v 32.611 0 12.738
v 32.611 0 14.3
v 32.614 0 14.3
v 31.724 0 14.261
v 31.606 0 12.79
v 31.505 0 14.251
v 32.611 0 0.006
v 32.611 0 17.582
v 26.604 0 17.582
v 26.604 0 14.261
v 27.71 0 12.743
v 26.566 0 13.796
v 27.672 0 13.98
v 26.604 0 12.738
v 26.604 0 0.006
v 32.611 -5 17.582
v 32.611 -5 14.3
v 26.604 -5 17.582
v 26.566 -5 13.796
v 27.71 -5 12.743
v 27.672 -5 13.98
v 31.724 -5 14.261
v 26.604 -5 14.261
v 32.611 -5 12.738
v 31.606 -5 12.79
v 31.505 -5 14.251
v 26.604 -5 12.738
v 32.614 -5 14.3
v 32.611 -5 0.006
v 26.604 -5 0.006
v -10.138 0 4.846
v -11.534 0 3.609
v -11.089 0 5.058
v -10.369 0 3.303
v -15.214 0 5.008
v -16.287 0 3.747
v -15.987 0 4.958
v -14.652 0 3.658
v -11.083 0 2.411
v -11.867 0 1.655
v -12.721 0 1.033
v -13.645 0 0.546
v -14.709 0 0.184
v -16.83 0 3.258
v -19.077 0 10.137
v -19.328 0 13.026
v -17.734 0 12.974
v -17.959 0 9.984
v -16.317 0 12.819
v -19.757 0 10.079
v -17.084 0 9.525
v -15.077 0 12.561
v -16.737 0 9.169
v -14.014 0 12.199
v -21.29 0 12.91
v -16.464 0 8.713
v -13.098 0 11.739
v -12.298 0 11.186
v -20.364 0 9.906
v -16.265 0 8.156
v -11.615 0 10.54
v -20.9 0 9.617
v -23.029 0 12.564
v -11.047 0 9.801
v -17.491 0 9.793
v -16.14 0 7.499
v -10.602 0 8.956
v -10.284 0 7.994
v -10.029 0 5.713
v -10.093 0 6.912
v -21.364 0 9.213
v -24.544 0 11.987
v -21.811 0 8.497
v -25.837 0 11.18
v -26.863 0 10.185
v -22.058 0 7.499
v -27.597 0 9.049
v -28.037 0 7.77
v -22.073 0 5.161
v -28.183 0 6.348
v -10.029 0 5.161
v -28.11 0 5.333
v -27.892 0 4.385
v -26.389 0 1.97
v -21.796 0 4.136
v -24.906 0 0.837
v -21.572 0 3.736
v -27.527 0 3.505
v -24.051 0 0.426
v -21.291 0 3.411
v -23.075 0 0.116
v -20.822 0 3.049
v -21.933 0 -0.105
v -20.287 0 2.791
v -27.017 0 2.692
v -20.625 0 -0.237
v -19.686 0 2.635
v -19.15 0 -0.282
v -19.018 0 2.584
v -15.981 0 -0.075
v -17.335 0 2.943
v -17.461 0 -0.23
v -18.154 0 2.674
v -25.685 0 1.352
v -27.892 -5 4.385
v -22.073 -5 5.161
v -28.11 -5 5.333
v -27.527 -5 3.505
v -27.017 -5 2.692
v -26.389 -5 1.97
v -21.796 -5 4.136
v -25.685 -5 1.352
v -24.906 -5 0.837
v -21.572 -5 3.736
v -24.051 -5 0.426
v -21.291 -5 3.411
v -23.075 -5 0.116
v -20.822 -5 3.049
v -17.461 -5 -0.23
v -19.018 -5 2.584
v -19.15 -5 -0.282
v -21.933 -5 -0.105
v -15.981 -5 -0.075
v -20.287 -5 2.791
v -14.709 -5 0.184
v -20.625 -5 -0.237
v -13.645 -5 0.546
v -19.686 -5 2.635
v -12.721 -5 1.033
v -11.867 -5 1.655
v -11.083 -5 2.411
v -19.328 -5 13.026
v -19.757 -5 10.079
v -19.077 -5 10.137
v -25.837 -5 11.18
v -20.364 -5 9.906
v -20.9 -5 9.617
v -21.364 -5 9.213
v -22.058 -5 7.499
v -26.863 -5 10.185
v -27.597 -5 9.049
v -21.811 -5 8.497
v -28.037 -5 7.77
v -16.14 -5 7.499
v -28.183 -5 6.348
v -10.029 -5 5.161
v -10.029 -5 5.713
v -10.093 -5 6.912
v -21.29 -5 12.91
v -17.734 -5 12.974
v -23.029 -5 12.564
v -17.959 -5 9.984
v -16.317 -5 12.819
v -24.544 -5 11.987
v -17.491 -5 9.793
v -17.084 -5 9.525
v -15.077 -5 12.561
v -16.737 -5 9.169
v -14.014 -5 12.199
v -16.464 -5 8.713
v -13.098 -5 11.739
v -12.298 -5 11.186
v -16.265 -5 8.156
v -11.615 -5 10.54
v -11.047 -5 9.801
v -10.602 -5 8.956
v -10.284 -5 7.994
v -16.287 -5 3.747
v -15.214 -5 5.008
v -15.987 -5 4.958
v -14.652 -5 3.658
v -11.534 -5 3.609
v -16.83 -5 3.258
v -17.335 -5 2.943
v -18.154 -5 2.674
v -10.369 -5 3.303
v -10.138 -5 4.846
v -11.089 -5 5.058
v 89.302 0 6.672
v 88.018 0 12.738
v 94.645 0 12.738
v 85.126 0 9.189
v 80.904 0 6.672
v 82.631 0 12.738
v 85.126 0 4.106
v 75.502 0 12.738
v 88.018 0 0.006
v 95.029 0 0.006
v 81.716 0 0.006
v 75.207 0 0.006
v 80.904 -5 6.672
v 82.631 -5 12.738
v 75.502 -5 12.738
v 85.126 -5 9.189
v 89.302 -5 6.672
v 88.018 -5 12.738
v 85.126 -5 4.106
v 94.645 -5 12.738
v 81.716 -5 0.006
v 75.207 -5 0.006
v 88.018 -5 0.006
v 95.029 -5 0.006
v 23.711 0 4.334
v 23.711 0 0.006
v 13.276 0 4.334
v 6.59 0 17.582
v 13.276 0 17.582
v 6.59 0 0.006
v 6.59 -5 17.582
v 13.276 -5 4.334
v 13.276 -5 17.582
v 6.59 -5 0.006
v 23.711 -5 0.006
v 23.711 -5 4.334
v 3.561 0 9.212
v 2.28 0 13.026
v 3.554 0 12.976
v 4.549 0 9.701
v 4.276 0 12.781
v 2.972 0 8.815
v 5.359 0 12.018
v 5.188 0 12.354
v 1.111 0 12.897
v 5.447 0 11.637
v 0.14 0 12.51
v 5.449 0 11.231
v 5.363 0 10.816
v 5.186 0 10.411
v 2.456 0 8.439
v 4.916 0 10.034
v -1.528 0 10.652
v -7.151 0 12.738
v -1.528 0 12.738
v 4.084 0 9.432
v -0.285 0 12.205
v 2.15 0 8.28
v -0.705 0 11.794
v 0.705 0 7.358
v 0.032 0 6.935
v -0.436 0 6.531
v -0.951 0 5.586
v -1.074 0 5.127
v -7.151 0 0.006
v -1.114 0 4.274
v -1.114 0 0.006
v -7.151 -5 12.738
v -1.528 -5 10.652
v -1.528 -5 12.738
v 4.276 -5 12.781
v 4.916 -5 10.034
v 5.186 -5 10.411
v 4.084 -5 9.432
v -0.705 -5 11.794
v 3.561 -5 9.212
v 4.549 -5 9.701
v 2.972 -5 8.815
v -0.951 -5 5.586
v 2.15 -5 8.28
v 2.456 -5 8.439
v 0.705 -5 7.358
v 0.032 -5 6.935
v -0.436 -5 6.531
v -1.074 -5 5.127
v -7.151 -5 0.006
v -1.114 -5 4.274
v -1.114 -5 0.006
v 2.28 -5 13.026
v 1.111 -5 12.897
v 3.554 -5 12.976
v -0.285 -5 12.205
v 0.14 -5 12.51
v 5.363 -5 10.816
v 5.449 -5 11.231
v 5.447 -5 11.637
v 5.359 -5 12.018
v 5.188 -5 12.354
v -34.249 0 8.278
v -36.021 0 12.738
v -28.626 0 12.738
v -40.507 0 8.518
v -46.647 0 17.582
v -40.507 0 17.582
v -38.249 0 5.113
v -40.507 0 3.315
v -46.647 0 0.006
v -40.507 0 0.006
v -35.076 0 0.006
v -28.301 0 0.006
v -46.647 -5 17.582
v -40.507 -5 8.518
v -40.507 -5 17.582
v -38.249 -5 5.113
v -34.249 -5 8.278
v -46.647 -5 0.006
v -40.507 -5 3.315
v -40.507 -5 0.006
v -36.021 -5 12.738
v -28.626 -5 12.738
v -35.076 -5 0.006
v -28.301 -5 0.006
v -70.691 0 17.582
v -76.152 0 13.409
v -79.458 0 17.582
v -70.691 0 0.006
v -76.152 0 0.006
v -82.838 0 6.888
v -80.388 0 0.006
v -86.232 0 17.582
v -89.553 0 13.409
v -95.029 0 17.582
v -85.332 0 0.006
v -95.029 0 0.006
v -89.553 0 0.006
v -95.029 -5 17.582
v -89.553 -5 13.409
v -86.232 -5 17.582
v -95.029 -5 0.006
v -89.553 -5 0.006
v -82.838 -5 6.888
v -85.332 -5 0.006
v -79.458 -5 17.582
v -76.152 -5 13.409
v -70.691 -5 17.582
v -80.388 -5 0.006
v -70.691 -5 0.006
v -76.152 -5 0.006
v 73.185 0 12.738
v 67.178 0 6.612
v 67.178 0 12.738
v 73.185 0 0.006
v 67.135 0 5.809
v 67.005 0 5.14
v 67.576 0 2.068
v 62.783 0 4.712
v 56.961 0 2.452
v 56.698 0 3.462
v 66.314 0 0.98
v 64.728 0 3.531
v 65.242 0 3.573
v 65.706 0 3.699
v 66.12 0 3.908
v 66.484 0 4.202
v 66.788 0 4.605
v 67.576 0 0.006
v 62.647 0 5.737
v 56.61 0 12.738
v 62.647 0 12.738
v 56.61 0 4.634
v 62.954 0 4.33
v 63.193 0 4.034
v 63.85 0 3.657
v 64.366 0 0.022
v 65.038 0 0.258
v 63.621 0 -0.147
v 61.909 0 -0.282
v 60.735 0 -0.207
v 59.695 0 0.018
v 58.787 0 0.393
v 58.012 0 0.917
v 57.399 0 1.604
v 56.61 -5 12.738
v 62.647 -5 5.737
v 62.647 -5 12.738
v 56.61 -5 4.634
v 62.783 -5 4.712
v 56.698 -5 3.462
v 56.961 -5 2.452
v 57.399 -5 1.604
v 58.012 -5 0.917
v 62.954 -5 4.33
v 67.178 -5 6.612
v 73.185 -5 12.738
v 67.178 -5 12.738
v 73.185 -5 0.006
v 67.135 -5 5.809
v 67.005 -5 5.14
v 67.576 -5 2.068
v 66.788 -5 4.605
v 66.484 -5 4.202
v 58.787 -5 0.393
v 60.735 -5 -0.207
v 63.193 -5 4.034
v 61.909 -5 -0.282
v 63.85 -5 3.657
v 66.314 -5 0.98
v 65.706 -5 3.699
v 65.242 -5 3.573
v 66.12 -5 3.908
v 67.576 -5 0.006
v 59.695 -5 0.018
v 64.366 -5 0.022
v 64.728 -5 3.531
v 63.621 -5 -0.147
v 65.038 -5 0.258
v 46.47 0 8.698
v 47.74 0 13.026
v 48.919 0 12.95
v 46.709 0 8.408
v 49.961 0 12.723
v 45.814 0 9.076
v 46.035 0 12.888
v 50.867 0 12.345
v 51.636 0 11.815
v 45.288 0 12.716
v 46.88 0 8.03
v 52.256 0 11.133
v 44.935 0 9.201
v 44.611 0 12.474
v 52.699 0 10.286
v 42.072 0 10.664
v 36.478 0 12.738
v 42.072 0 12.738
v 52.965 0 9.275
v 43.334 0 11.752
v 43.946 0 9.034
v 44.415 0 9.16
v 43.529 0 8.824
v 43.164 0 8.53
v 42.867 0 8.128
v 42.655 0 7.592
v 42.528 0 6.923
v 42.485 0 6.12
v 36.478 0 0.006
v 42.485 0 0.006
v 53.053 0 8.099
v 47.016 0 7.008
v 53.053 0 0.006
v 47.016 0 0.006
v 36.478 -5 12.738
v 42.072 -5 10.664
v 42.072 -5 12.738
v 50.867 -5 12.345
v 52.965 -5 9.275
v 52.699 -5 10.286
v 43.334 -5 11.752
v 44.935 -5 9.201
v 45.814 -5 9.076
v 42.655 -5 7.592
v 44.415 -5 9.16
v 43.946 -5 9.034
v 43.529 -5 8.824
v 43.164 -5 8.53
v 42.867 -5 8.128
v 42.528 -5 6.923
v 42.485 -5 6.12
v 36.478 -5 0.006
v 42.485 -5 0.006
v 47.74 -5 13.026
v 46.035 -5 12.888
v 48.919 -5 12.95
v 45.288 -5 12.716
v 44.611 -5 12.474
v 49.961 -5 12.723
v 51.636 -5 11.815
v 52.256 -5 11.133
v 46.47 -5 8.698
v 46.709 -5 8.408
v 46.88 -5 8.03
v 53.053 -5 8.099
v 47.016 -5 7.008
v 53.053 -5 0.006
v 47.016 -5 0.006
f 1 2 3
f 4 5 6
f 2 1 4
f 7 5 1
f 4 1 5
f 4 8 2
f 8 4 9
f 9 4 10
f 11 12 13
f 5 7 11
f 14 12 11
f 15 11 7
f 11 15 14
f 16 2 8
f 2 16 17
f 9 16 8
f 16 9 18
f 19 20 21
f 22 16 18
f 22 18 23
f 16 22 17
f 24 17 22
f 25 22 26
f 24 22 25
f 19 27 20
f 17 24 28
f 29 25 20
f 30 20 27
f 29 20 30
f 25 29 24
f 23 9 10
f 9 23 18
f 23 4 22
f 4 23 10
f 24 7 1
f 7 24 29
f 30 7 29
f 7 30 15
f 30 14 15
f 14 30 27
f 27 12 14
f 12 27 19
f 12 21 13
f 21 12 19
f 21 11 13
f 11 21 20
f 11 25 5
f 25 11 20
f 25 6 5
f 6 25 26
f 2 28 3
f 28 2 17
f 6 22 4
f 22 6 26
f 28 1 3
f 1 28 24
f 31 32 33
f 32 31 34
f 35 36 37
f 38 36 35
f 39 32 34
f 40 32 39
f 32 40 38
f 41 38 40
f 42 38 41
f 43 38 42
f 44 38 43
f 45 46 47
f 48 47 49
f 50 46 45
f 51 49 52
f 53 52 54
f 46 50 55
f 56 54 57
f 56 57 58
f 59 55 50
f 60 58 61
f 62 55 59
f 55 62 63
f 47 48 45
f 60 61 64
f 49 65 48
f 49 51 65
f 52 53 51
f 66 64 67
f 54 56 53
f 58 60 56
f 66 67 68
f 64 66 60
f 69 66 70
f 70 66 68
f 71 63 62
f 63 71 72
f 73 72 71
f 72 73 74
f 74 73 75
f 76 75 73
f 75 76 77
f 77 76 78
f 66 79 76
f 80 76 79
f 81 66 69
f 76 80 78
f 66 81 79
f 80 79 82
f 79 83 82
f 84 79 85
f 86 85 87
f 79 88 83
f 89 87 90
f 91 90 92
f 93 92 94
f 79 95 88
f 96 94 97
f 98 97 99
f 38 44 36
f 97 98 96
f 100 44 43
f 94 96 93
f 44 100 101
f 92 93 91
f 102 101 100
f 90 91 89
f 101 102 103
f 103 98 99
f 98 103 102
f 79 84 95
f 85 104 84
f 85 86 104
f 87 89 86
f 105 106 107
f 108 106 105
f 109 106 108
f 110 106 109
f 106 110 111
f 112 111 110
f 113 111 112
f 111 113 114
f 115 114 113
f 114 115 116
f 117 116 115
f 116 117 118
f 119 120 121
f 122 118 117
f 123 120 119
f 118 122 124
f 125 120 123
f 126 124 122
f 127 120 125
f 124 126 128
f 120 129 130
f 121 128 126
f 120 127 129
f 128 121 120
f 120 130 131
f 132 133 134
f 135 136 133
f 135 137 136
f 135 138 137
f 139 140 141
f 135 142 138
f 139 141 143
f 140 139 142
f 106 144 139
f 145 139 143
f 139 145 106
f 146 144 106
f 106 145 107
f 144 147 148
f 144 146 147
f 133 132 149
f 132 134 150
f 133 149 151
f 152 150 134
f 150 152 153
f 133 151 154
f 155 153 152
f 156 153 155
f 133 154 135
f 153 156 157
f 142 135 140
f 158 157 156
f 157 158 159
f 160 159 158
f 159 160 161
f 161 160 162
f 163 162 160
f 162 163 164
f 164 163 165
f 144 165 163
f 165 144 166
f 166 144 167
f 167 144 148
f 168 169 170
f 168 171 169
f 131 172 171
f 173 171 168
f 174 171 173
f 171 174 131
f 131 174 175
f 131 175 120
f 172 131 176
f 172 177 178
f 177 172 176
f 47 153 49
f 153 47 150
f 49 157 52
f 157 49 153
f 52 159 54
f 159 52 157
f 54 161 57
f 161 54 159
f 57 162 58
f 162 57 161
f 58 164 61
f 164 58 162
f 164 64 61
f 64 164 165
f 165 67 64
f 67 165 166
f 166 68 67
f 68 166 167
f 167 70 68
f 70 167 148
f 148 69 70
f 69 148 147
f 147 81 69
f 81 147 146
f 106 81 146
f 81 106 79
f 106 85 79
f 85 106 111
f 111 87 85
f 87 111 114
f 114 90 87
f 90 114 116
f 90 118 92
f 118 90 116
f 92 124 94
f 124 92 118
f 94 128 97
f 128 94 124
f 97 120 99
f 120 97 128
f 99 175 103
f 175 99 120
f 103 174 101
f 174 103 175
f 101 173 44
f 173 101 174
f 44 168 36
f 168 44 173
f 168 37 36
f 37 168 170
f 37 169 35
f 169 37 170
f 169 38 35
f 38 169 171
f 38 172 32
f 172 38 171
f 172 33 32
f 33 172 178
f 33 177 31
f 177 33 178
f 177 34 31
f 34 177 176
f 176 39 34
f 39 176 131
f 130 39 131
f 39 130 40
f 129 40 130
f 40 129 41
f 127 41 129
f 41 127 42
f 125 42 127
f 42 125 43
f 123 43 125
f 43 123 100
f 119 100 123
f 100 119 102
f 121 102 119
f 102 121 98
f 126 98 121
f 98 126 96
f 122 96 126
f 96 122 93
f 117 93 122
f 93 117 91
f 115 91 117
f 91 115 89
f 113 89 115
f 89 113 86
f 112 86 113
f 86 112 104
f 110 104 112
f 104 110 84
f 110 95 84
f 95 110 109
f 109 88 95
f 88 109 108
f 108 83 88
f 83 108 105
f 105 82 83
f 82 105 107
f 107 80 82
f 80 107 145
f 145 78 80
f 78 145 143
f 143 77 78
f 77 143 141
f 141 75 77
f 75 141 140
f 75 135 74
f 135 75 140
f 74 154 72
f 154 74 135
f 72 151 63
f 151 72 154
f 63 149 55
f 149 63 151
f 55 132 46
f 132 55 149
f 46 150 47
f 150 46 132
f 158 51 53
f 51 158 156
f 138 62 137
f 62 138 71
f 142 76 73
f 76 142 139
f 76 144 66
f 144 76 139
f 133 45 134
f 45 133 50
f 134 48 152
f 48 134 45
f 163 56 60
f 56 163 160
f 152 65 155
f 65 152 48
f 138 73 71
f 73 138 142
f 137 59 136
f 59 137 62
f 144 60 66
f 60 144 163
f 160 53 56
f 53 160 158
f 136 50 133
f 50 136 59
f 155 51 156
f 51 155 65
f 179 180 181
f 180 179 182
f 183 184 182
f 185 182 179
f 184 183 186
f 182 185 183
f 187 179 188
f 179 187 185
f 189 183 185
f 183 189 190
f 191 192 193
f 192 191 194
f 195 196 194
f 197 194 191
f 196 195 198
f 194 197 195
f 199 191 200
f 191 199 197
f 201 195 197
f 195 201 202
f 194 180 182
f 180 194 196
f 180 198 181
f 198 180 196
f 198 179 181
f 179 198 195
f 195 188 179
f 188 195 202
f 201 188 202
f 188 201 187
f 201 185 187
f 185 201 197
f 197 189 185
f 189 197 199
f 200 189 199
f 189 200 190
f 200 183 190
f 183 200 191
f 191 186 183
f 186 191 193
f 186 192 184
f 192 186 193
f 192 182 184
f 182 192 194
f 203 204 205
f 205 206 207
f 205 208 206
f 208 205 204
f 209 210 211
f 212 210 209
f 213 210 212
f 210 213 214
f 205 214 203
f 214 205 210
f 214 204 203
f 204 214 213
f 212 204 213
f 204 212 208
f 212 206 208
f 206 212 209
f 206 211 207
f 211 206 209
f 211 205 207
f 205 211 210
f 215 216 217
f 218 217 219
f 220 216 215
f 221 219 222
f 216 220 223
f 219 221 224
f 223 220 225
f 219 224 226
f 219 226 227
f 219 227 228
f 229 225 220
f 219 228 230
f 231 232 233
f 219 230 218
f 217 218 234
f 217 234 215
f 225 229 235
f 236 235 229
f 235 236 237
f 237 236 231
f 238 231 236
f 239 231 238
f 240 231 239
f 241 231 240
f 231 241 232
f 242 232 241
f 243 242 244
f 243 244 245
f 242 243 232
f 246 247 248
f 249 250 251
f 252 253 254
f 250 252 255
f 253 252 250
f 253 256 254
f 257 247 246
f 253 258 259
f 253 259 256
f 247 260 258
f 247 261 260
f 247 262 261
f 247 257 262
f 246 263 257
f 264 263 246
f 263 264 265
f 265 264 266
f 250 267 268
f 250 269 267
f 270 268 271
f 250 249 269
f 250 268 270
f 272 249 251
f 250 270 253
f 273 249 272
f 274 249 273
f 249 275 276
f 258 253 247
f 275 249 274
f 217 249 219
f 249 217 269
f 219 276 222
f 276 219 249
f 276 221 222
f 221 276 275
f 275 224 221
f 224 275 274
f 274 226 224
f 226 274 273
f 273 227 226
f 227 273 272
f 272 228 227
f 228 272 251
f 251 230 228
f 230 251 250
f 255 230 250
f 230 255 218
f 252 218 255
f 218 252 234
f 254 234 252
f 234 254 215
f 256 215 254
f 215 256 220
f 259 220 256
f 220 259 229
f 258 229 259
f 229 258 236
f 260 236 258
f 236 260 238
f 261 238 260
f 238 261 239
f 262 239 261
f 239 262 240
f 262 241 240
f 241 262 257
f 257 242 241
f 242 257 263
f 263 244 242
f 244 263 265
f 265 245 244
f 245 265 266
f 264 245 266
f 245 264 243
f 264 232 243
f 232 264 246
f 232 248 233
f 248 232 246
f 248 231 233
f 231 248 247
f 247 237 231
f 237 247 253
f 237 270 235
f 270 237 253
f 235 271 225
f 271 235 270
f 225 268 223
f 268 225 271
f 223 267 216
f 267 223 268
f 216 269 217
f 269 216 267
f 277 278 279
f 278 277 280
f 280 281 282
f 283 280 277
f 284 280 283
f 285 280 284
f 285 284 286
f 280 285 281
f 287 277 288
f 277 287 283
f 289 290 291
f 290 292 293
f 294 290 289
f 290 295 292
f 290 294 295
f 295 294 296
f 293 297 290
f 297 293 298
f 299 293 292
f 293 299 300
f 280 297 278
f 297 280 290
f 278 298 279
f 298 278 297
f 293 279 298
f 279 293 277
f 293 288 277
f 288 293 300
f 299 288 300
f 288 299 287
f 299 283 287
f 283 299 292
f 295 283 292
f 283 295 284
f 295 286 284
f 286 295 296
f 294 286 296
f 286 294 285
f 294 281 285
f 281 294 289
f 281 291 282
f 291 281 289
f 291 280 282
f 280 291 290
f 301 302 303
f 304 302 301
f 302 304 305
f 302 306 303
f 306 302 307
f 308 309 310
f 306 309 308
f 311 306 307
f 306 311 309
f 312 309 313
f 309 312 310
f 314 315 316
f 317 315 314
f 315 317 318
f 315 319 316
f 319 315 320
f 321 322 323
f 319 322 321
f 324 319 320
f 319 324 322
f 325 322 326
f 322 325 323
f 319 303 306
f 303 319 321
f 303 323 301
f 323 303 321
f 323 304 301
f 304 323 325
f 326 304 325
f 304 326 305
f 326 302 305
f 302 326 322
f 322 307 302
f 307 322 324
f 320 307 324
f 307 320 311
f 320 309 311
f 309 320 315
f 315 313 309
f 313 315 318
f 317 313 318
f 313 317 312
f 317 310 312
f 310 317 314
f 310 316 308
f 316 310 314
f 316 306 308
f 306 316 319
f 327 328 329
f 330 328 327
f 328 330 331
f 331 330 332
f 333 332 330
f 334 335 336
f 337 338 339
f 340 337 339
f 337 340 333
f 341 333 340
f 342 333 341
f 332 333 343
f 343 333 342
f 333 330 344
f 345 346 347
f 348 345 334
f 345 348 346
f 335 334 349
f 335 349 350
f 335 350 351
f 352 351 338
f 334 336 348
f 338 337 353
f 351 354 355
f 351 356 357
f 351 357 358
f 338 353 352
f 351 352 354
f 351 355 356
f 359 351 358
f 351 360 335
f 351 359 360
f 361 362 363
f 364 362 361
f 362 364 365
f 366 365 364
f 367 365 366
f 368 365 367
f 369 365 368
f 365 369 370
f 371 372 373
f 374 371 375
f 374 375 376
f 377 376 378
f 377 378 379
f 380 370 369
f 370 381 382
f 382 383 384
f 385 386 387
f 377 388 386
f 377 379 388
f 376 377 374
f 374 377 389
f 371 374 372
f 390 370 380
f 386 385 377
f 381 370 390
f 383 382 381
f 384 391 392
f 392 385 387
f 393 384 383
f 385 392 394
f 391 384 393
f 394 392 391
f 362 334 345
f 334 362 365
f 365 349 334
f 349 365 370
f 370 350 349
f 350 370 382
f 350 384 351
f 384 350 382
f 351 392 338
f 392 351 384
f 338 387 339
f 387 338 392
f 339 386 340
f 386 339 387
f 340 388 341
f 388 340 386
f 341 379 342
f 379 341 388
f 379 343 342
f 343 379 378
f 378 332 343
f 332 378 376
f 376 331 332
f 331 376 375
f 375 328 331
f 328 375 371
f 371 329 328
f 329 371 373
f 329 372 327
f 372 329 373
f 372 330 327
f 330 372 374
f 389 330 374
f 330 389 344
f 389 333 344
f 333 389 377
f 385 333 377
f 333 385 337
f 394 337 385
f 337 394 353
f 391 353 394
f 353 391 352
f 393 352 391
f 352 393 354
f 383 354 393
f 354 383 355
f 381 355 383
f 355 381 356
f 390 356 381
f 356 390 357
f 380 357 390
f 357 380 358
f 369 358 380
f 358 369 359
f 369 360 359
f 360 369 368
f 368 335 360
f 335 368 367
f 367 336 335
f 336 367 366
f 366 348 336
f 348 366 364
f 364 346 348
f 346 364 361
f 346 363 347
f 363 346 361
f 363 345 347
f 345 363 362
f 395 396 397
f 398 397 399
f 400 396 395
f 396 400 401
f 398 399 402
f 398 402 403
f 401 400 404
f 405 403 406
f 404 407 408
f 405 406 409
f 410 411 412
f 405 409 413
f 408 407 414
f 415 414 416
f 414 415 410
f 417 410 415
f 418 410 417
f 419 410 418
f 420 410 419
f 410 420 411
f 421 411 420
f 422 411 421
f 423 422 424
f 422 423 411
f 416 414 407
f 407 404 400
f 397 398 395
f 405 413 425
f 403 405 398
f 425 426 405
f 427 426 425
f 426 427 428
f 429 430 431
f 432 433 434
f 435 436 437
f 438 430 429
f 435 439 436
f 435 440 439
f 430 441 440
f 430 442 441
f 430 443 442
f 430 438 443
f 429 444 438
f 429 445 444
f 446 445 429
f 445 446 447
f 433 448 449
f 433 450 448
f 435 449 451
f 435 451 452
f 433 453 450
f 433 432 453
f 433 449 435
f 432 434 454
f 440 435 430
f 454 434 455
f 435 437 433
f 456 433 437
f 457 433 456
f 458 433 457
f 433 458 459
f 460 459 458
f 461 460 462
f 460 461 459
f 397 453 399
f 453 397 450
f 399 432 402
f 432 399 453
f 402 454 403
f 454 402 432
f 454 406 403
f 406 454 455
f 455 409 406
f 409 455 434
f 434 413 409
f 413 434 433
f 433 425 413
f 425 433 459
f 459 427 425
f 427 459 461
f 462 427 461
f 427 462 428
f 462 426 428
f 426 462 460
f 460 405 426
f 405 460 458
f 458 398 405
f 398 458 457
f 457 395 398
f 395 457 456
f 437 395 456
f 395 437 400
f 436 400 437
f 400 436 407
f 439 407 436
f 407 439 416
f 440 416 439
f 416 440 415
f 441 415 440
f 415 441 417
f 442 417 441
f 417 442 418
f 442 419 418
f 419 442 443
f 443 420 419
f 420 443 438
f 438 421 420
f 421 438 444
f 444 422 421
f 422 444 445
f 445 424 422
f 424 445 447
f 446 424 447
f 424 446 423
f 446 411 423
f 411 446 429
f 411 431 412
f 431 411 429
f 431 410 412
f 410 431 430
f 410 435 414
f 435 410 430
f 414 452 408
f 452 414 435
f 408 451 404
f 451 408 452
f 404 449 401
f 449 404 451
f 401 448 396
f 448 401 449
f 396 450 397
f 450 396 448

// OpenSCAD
// Module names are of the form poly_<inkscape-path-id>().  As a result,
// you can associate a polygon in this OpenSCAD program with the corresponding
// SVG element in the Inkscape document by looking for the XML element with
// the attribute id="inkscape-path-id".

// fudge value is used to ensure that subtracted solids are a tad taller
// in the z dimension than the polygon being subtracted from.  This helps
// keep the resulting .stl file manifold.
fudge = 0.1;

module poly_path3760(h)
{
  scale([25.4/90, -25.4/90, 1]) union()
  {
    difference()
    {
       linear_extrude(height=h)
         polygon([[-212.671501,-1.691538],[-221.798754,0.021524],[-225.260686,1.219558],[-228.561952,2.106254],[-231.012997,2.482823],[-233.431774,1.398741],[-235.380819,0.057421],[-236.746062,-1.608847],[-237.413436,-3.667778],[-236.831865,-5.396518],[-236.193052,-6.506591],[-234.475838,-8.410913],[-231.808672,-10.747248],[-228.200136,-12.743814],[-224.722368,-13.911959],[-220.146317,-14.782818],[-214.811999,-15.324396],[-209.059257,-15.504968],[-200.430199,-15.281919],[-193.683786,-14.612904],[-188.362558,-13.285389],[-186.064728,-12.263238],[-184.008754,-11.002153],[-181.576964,-8.686999],[-179.720354,-5.564798],[-178.543713,-2.155801],[-178.151434,1.104468],[-178.151434,21.027293],[-177.680758,26.039859],[-175.484259,30.627636],[-195.461903,30.627636],[-197.030823,27.993920],[-197.762989,25.105319],[-201.933750,27.908959],[-206.078298,29.778048],[-212.184054,31.179865],[-219.204966,31.647138],[-223.875797,31.413501],[-227.951736,30.712593],[-231.432785,29.544412],[-234.318946,27.908958],[-236.561202,25.931014],[-238.162813,23.735362],[-239.123778,21.322001],[-239.444100,18.690929],[-239.212030,16.235101],[-238.515820,14.007592],[-237.355468,12.008404],[-235.730974,10.237535],[-233.113108,8.232279],[-229.267874,5.893690],[-224.638171,3.767490],[-219.666898,2.399403],[-214.574176,1.754199],[-210.976832,1.566629],[-206.496669,1.328556],[-202.835879,1.035999],[-200.927014,0.920466],[-198.965831,0.509755],[-199.371172,-2.198281],[-199.877797,-3.193895],[-200.587056,-3.950574],[-202.822807,-4.906336],[-206.287484,-5.224961],[-210.863536,-4.885098],[-214.132106,-3.865622],[-214.401810,-3.419490],[-213.718748,-3.021954],[-212.904135,-2.491242],[-212.704126,-2.119142],[-212.779184,-1.645583]]);
       translate([0, 0, -fudge])
         linear_extrude(height=h+2*fudge)
           polygon([[-198.965831,9.218034],[-208.117894,11.469437],[-213.413042,12.860651],[-216.328605,14.230599],[-217.662209,15.728007],[-218.106722,17.416552],[-217.675282,19.275029],[-216.380898,20.772418],[-214.197505,21.728213],[-211.203452,22.046804],[-207.777991,21.696355],[-204.613965,20.644980],[-201.986045,19.094495],[-200.273272,17.246629],[-199.292725,14.910279],[-198.965831,11.979187],[-198.965831,9.218034]]);
    }
  }
}

module poly_path3776(h)
{
  scale([25.4/90, -25.4/90, 1]) union()
  {
    linear_extrude(height=h)
      polygon([[267.527865,-14.485466],[292.787554,-14.485466],[301.625832,-1.911570],[311.876139,-14.485466],[335.357711,-14.485466],[316.426018,7.009098],[336.717446,30.627636],[311.876139,30.627636],[301.625832,16.099689],[289.545104,30.627636],[266.481914,30.627636],[286.668744,7.009098]]);
  }
}

module poly_path3768(h)
{
  scale([25.4/90, -25.4/90, 1]) union()
  {
    linear_extrude(height=h)
      polygon([[23.350848,-31.647138],[47.041617,-31.647138],[47.041617,15.292577],[84.015946,15.292577],[84.015946,30.627636],[23.350848,30.627636]]);
  }
}

module poly_path3766(h)
{
  scale([25.4/90, -25.4/90, 1]) union()
  {
    linear_extrude(height=h)
      polygon([[-25.338131,-14.485466],[-5.412781,-14.485466],[-5.412781,-7.094050],[-2.497219,-11.140183],[-1.010004,-12.597763],[0.496833,-13.678354],[3.935368,-15.048281],[8.079976,-15.504968],[12.592364,-15.327822],[15.150066,-14.638151],[18.382576,-13.126127],[18.987981,-11.932268],[19.299182,-10.583801],[19.306957,-9.143675],[19.002084,-7.674839],[18.375340,-6.240244],[17.417503,-4.902839],[16.119351,-3.725573],[14.471660,-2.771397],[12.616463,-1.989599],[10.530801,-0.585244],[8.701879,0.746727],[7.616900,1.311369],[2.497500,4.579272],[0.115046,6.077613],[-1.546569,7.507871],[-3.370319,10.857455],[-3.806716,12.483258],[-3.948459,15.504977],[-3.948459,30.627636],[-25.338131,30.627636],[-25.338131,-14.485466]]);
  }
}

module poly_path3762(h)
{
  scale([25.4/90, -25.4/90, 1]) union()
  {
    linear_extrude(height=h)
      polygon([[-165.286246,-31.647138],[-143.530486,-31.647138],[-143.530486,0.467279],[-127.632045,-14.485466],[-101.430993,-14.485466],[-121.356343,1.316867],[-100.280455,30.627636],[-124.285008,30.627636],[-135.528972,12.531424],[-143.530486,18.903328],[-143.530486,30.627636],[-165.286246,30.627636],[-165.286246,-31.647138]]);
  }
}

module poly_path3758(h)
{
  scale([25.4/90, -25.4/90, 1]) union()
  {
    linear_extrude(height=h)
      polygon([[-336.717446,-31.647138],[-305.548137,-31.647138],[-293.519712,6.244471],[-281.543585,-31.647138],[-250.478871,-31.647138],[-250.478871,30.627636],[-269.828945,30.627636],[-269.828945,-16.864307],[-284.838328,30.627636],[-302.357990,30.627636],[-317.315074,-16.864307],[-317.315074,30.627636],[-336.717446,30.627636],[-336.717446,-31.647138]]);
  }
}

module poly_path3770(h)
{
  scale([25.4/90, -25.4/90, 1]) union()
  {
    linear_extrude(height=h)
      polygon([[94.266230,-31.647138],[115.551304,-31.647138],[115.551304,-19.880345],[94.266230,-19.880345]]);
    linear_extrude(height=h)
      polygon([[94.266230,-14.485466],[94.131995,-18.235470],[98.051466,-18.887538],[98.183925,-14.502671],[111.989201,-14.669403],[111.631434,-19.845710],[115.560568,-20.021184],[115.551692,-14.485466],[115.551692,30.627636],[94.266619,30.627636],[94.266619,-14.485466]]);
  }
}

module poly_path3774(h)
{
  scale([25.4/90, -25.4/90, 1]) union()
  {
    linear_extrude(height=h)
      polygon([[259.317154,30.627636],[239.444097,30.627636],[239.444097,23.321182],[234.972634,27.176190],[230.448927,29.735572],[228.069373,30.571882],[225.428345,31.169246],[219.361866,31.647138],[215.204204,31.381642],[211.517228,30.585156],[208.300936,29.257678],[205.555326,27.399207],[203.381706,24.967265],[201.829122,21.961850],[200.897575,18.382961],[200.587065,14.230599],[200.587065,-14.485466],[221.976737,-14.485466],[221.976737,10.322497],[222.460471,13.954494],[223.065165,15.308519],[223.911745,16.354565],[226.238962,17.692674],[229.350683,18.138702],[231.171270,17.990030],[232.815365,17.543998],[234.282971,16.800607],[235.574091,15.759852],[236.649433,14.334149],[237.417543,12.435855],[237.878421,10.064972],[238.032069,7.221497],[238.032069,-14.485466],[259.317154,-14.485466],[259.317154,30.627636]]);
  }
}

module poly_path3764(h)
{
  scale([25.4/90, -25.4/90, 1]) union()
  {
    difference()
    {
       linear_extrude(height=h)
         polygon([[-35.536144,12.361501],[-78.210911,12.361501],[-77.230346,15.993503],[-76.436072,17.411249],[-75.439137,18.563491],[-73.778708,19.845843],[-71.882929,20.761806],[-69.751799,21.311381],[-67.385319,21.494568],[-64.325950,21.175982],[-61.423412,20.220191],[-59.632254,19.105115],[-57.710286,17.374066],[-56.647315,13.083128],[-53.907886,12.904535],[-51.915757,17.689542],[-40.867198,17.861439],[-39.291033,12.727681],[-35.922415,13.480078],[-36.738986,18.945805],[-39.268913,22.105213],[-42.047231,24.786726],[-45.073939,26.990342],[-48.349038,28.716061],[-52.117750,29.998407],[-56.625148,30.914368],[-61.871233,31.463945],[-67.856006,31.647138],[-73.079230,31.490496],[-77.714098,31.020570],[-81.760610,30.237359],[-85.218768,29.140859],[-88.248766,27.683286],[-91.010730,25.859330],[-93.504663,23.668987],[-95.730565,21.112255],[-97.538101,18.231629],[-98.829197,15.112052],[-99.603854,11.753525],[-99.862073,8.156046],[-99.342367,3.119600],[-97.783248,-1.412413],[-95.184715,-5.439995],[-91.546764,-8.963149],[-86.967478,-11.825168],[-81.597184,-13.869478],[-75.435883,-15.096078],[-68.483574,-15.504968],[-62.835468,-15.321750],[-57.814915,-14.772165],[-53.421915,-13.856212],[-49.656468,-12.573891],[-46.410790,-10.943725],[-43.576932,-8.984357],[-41.154893,-6.695786],[-39.144671,-4.078012],[-37.565978,-1.085858],[-36.438325,2.325769],[-35.761714,6.156871],[-35.536144,10.407449],[-35.536144,12.361501]]);
       translate([0, 0, -fudge])
         linear_extrude(height=h+2*fudge)
           polygon([[-57.187317,4.078021],[-57.631866,1.749638],[-58.337890,-0.222990],[-59.305387,-1.839865],[-60.534353,-3.100986],[-61.975823,-4.048788],[-63.633008,-4.725797],[-67.594515,-5.267437],[-70.003484,-5.062984],[-72.157493,-4.449681],[-74.056541,-3.427527],[-75.700628,-1.996523],[-77.282645,0.541640],[-78.158606,4.078021],[-57.187317,4.078021]]);
    }
  }
}

module poly_path3772(h)
{
  scale([25.4/90, -25.4/90, 1]) union()
  {
    linear_extrude(height=h)
      polygon([[129.253267,-14.485466],[149.074019,-14.485466],[149.074019,-7.136536],[153.545433,-10.991506],[158.069190,-13.550916],[160.468317,-14.405790],[163.115869,-15.016422],[169.156261,-15.504968],[173.333496,-15.236791],[177.026997,-14.432329],[180.236764,-13.091582],[182.962801,-11.214552],[185.159263,-8.798514],[186.728176,-5.798402],[187.669540,-2.214213],[187.983356,1.954056],[187.983356,30.627636],[166.593685,30.627636],[166.593685,5.819682],[166.109900,2.198335],[165.505219,0.857574],[164.658676,-0.169909],[162.331409,-1.507989],[159.219739,-1.954047],[157.376234,-1.805349],[155.715782,-1.359311],[154.238383,-0.615930],[152.944036,0.424794],[151.891534,1.850528],[151.139751,3.748831],[150.688689,6.119705],[150.538352,8.963149],[150.538352,30.627636],[129.253267,30.627636]]);
  }
}

module makerlinux(h) {
  translate([0,0,8.65]) rotate([90,0,0]) {
    poly_path3760(5);
    poly_path3776(5);
    poly_path3768(5);
    poly_path3766(5);
    poly_path3762(5);
    poly_path3758(5);
    poly_path3770(5);
    poly_path3774(5);
    poly_path3764(5);
    poly_path3772(5);
  }
}

makerlinux(5);
